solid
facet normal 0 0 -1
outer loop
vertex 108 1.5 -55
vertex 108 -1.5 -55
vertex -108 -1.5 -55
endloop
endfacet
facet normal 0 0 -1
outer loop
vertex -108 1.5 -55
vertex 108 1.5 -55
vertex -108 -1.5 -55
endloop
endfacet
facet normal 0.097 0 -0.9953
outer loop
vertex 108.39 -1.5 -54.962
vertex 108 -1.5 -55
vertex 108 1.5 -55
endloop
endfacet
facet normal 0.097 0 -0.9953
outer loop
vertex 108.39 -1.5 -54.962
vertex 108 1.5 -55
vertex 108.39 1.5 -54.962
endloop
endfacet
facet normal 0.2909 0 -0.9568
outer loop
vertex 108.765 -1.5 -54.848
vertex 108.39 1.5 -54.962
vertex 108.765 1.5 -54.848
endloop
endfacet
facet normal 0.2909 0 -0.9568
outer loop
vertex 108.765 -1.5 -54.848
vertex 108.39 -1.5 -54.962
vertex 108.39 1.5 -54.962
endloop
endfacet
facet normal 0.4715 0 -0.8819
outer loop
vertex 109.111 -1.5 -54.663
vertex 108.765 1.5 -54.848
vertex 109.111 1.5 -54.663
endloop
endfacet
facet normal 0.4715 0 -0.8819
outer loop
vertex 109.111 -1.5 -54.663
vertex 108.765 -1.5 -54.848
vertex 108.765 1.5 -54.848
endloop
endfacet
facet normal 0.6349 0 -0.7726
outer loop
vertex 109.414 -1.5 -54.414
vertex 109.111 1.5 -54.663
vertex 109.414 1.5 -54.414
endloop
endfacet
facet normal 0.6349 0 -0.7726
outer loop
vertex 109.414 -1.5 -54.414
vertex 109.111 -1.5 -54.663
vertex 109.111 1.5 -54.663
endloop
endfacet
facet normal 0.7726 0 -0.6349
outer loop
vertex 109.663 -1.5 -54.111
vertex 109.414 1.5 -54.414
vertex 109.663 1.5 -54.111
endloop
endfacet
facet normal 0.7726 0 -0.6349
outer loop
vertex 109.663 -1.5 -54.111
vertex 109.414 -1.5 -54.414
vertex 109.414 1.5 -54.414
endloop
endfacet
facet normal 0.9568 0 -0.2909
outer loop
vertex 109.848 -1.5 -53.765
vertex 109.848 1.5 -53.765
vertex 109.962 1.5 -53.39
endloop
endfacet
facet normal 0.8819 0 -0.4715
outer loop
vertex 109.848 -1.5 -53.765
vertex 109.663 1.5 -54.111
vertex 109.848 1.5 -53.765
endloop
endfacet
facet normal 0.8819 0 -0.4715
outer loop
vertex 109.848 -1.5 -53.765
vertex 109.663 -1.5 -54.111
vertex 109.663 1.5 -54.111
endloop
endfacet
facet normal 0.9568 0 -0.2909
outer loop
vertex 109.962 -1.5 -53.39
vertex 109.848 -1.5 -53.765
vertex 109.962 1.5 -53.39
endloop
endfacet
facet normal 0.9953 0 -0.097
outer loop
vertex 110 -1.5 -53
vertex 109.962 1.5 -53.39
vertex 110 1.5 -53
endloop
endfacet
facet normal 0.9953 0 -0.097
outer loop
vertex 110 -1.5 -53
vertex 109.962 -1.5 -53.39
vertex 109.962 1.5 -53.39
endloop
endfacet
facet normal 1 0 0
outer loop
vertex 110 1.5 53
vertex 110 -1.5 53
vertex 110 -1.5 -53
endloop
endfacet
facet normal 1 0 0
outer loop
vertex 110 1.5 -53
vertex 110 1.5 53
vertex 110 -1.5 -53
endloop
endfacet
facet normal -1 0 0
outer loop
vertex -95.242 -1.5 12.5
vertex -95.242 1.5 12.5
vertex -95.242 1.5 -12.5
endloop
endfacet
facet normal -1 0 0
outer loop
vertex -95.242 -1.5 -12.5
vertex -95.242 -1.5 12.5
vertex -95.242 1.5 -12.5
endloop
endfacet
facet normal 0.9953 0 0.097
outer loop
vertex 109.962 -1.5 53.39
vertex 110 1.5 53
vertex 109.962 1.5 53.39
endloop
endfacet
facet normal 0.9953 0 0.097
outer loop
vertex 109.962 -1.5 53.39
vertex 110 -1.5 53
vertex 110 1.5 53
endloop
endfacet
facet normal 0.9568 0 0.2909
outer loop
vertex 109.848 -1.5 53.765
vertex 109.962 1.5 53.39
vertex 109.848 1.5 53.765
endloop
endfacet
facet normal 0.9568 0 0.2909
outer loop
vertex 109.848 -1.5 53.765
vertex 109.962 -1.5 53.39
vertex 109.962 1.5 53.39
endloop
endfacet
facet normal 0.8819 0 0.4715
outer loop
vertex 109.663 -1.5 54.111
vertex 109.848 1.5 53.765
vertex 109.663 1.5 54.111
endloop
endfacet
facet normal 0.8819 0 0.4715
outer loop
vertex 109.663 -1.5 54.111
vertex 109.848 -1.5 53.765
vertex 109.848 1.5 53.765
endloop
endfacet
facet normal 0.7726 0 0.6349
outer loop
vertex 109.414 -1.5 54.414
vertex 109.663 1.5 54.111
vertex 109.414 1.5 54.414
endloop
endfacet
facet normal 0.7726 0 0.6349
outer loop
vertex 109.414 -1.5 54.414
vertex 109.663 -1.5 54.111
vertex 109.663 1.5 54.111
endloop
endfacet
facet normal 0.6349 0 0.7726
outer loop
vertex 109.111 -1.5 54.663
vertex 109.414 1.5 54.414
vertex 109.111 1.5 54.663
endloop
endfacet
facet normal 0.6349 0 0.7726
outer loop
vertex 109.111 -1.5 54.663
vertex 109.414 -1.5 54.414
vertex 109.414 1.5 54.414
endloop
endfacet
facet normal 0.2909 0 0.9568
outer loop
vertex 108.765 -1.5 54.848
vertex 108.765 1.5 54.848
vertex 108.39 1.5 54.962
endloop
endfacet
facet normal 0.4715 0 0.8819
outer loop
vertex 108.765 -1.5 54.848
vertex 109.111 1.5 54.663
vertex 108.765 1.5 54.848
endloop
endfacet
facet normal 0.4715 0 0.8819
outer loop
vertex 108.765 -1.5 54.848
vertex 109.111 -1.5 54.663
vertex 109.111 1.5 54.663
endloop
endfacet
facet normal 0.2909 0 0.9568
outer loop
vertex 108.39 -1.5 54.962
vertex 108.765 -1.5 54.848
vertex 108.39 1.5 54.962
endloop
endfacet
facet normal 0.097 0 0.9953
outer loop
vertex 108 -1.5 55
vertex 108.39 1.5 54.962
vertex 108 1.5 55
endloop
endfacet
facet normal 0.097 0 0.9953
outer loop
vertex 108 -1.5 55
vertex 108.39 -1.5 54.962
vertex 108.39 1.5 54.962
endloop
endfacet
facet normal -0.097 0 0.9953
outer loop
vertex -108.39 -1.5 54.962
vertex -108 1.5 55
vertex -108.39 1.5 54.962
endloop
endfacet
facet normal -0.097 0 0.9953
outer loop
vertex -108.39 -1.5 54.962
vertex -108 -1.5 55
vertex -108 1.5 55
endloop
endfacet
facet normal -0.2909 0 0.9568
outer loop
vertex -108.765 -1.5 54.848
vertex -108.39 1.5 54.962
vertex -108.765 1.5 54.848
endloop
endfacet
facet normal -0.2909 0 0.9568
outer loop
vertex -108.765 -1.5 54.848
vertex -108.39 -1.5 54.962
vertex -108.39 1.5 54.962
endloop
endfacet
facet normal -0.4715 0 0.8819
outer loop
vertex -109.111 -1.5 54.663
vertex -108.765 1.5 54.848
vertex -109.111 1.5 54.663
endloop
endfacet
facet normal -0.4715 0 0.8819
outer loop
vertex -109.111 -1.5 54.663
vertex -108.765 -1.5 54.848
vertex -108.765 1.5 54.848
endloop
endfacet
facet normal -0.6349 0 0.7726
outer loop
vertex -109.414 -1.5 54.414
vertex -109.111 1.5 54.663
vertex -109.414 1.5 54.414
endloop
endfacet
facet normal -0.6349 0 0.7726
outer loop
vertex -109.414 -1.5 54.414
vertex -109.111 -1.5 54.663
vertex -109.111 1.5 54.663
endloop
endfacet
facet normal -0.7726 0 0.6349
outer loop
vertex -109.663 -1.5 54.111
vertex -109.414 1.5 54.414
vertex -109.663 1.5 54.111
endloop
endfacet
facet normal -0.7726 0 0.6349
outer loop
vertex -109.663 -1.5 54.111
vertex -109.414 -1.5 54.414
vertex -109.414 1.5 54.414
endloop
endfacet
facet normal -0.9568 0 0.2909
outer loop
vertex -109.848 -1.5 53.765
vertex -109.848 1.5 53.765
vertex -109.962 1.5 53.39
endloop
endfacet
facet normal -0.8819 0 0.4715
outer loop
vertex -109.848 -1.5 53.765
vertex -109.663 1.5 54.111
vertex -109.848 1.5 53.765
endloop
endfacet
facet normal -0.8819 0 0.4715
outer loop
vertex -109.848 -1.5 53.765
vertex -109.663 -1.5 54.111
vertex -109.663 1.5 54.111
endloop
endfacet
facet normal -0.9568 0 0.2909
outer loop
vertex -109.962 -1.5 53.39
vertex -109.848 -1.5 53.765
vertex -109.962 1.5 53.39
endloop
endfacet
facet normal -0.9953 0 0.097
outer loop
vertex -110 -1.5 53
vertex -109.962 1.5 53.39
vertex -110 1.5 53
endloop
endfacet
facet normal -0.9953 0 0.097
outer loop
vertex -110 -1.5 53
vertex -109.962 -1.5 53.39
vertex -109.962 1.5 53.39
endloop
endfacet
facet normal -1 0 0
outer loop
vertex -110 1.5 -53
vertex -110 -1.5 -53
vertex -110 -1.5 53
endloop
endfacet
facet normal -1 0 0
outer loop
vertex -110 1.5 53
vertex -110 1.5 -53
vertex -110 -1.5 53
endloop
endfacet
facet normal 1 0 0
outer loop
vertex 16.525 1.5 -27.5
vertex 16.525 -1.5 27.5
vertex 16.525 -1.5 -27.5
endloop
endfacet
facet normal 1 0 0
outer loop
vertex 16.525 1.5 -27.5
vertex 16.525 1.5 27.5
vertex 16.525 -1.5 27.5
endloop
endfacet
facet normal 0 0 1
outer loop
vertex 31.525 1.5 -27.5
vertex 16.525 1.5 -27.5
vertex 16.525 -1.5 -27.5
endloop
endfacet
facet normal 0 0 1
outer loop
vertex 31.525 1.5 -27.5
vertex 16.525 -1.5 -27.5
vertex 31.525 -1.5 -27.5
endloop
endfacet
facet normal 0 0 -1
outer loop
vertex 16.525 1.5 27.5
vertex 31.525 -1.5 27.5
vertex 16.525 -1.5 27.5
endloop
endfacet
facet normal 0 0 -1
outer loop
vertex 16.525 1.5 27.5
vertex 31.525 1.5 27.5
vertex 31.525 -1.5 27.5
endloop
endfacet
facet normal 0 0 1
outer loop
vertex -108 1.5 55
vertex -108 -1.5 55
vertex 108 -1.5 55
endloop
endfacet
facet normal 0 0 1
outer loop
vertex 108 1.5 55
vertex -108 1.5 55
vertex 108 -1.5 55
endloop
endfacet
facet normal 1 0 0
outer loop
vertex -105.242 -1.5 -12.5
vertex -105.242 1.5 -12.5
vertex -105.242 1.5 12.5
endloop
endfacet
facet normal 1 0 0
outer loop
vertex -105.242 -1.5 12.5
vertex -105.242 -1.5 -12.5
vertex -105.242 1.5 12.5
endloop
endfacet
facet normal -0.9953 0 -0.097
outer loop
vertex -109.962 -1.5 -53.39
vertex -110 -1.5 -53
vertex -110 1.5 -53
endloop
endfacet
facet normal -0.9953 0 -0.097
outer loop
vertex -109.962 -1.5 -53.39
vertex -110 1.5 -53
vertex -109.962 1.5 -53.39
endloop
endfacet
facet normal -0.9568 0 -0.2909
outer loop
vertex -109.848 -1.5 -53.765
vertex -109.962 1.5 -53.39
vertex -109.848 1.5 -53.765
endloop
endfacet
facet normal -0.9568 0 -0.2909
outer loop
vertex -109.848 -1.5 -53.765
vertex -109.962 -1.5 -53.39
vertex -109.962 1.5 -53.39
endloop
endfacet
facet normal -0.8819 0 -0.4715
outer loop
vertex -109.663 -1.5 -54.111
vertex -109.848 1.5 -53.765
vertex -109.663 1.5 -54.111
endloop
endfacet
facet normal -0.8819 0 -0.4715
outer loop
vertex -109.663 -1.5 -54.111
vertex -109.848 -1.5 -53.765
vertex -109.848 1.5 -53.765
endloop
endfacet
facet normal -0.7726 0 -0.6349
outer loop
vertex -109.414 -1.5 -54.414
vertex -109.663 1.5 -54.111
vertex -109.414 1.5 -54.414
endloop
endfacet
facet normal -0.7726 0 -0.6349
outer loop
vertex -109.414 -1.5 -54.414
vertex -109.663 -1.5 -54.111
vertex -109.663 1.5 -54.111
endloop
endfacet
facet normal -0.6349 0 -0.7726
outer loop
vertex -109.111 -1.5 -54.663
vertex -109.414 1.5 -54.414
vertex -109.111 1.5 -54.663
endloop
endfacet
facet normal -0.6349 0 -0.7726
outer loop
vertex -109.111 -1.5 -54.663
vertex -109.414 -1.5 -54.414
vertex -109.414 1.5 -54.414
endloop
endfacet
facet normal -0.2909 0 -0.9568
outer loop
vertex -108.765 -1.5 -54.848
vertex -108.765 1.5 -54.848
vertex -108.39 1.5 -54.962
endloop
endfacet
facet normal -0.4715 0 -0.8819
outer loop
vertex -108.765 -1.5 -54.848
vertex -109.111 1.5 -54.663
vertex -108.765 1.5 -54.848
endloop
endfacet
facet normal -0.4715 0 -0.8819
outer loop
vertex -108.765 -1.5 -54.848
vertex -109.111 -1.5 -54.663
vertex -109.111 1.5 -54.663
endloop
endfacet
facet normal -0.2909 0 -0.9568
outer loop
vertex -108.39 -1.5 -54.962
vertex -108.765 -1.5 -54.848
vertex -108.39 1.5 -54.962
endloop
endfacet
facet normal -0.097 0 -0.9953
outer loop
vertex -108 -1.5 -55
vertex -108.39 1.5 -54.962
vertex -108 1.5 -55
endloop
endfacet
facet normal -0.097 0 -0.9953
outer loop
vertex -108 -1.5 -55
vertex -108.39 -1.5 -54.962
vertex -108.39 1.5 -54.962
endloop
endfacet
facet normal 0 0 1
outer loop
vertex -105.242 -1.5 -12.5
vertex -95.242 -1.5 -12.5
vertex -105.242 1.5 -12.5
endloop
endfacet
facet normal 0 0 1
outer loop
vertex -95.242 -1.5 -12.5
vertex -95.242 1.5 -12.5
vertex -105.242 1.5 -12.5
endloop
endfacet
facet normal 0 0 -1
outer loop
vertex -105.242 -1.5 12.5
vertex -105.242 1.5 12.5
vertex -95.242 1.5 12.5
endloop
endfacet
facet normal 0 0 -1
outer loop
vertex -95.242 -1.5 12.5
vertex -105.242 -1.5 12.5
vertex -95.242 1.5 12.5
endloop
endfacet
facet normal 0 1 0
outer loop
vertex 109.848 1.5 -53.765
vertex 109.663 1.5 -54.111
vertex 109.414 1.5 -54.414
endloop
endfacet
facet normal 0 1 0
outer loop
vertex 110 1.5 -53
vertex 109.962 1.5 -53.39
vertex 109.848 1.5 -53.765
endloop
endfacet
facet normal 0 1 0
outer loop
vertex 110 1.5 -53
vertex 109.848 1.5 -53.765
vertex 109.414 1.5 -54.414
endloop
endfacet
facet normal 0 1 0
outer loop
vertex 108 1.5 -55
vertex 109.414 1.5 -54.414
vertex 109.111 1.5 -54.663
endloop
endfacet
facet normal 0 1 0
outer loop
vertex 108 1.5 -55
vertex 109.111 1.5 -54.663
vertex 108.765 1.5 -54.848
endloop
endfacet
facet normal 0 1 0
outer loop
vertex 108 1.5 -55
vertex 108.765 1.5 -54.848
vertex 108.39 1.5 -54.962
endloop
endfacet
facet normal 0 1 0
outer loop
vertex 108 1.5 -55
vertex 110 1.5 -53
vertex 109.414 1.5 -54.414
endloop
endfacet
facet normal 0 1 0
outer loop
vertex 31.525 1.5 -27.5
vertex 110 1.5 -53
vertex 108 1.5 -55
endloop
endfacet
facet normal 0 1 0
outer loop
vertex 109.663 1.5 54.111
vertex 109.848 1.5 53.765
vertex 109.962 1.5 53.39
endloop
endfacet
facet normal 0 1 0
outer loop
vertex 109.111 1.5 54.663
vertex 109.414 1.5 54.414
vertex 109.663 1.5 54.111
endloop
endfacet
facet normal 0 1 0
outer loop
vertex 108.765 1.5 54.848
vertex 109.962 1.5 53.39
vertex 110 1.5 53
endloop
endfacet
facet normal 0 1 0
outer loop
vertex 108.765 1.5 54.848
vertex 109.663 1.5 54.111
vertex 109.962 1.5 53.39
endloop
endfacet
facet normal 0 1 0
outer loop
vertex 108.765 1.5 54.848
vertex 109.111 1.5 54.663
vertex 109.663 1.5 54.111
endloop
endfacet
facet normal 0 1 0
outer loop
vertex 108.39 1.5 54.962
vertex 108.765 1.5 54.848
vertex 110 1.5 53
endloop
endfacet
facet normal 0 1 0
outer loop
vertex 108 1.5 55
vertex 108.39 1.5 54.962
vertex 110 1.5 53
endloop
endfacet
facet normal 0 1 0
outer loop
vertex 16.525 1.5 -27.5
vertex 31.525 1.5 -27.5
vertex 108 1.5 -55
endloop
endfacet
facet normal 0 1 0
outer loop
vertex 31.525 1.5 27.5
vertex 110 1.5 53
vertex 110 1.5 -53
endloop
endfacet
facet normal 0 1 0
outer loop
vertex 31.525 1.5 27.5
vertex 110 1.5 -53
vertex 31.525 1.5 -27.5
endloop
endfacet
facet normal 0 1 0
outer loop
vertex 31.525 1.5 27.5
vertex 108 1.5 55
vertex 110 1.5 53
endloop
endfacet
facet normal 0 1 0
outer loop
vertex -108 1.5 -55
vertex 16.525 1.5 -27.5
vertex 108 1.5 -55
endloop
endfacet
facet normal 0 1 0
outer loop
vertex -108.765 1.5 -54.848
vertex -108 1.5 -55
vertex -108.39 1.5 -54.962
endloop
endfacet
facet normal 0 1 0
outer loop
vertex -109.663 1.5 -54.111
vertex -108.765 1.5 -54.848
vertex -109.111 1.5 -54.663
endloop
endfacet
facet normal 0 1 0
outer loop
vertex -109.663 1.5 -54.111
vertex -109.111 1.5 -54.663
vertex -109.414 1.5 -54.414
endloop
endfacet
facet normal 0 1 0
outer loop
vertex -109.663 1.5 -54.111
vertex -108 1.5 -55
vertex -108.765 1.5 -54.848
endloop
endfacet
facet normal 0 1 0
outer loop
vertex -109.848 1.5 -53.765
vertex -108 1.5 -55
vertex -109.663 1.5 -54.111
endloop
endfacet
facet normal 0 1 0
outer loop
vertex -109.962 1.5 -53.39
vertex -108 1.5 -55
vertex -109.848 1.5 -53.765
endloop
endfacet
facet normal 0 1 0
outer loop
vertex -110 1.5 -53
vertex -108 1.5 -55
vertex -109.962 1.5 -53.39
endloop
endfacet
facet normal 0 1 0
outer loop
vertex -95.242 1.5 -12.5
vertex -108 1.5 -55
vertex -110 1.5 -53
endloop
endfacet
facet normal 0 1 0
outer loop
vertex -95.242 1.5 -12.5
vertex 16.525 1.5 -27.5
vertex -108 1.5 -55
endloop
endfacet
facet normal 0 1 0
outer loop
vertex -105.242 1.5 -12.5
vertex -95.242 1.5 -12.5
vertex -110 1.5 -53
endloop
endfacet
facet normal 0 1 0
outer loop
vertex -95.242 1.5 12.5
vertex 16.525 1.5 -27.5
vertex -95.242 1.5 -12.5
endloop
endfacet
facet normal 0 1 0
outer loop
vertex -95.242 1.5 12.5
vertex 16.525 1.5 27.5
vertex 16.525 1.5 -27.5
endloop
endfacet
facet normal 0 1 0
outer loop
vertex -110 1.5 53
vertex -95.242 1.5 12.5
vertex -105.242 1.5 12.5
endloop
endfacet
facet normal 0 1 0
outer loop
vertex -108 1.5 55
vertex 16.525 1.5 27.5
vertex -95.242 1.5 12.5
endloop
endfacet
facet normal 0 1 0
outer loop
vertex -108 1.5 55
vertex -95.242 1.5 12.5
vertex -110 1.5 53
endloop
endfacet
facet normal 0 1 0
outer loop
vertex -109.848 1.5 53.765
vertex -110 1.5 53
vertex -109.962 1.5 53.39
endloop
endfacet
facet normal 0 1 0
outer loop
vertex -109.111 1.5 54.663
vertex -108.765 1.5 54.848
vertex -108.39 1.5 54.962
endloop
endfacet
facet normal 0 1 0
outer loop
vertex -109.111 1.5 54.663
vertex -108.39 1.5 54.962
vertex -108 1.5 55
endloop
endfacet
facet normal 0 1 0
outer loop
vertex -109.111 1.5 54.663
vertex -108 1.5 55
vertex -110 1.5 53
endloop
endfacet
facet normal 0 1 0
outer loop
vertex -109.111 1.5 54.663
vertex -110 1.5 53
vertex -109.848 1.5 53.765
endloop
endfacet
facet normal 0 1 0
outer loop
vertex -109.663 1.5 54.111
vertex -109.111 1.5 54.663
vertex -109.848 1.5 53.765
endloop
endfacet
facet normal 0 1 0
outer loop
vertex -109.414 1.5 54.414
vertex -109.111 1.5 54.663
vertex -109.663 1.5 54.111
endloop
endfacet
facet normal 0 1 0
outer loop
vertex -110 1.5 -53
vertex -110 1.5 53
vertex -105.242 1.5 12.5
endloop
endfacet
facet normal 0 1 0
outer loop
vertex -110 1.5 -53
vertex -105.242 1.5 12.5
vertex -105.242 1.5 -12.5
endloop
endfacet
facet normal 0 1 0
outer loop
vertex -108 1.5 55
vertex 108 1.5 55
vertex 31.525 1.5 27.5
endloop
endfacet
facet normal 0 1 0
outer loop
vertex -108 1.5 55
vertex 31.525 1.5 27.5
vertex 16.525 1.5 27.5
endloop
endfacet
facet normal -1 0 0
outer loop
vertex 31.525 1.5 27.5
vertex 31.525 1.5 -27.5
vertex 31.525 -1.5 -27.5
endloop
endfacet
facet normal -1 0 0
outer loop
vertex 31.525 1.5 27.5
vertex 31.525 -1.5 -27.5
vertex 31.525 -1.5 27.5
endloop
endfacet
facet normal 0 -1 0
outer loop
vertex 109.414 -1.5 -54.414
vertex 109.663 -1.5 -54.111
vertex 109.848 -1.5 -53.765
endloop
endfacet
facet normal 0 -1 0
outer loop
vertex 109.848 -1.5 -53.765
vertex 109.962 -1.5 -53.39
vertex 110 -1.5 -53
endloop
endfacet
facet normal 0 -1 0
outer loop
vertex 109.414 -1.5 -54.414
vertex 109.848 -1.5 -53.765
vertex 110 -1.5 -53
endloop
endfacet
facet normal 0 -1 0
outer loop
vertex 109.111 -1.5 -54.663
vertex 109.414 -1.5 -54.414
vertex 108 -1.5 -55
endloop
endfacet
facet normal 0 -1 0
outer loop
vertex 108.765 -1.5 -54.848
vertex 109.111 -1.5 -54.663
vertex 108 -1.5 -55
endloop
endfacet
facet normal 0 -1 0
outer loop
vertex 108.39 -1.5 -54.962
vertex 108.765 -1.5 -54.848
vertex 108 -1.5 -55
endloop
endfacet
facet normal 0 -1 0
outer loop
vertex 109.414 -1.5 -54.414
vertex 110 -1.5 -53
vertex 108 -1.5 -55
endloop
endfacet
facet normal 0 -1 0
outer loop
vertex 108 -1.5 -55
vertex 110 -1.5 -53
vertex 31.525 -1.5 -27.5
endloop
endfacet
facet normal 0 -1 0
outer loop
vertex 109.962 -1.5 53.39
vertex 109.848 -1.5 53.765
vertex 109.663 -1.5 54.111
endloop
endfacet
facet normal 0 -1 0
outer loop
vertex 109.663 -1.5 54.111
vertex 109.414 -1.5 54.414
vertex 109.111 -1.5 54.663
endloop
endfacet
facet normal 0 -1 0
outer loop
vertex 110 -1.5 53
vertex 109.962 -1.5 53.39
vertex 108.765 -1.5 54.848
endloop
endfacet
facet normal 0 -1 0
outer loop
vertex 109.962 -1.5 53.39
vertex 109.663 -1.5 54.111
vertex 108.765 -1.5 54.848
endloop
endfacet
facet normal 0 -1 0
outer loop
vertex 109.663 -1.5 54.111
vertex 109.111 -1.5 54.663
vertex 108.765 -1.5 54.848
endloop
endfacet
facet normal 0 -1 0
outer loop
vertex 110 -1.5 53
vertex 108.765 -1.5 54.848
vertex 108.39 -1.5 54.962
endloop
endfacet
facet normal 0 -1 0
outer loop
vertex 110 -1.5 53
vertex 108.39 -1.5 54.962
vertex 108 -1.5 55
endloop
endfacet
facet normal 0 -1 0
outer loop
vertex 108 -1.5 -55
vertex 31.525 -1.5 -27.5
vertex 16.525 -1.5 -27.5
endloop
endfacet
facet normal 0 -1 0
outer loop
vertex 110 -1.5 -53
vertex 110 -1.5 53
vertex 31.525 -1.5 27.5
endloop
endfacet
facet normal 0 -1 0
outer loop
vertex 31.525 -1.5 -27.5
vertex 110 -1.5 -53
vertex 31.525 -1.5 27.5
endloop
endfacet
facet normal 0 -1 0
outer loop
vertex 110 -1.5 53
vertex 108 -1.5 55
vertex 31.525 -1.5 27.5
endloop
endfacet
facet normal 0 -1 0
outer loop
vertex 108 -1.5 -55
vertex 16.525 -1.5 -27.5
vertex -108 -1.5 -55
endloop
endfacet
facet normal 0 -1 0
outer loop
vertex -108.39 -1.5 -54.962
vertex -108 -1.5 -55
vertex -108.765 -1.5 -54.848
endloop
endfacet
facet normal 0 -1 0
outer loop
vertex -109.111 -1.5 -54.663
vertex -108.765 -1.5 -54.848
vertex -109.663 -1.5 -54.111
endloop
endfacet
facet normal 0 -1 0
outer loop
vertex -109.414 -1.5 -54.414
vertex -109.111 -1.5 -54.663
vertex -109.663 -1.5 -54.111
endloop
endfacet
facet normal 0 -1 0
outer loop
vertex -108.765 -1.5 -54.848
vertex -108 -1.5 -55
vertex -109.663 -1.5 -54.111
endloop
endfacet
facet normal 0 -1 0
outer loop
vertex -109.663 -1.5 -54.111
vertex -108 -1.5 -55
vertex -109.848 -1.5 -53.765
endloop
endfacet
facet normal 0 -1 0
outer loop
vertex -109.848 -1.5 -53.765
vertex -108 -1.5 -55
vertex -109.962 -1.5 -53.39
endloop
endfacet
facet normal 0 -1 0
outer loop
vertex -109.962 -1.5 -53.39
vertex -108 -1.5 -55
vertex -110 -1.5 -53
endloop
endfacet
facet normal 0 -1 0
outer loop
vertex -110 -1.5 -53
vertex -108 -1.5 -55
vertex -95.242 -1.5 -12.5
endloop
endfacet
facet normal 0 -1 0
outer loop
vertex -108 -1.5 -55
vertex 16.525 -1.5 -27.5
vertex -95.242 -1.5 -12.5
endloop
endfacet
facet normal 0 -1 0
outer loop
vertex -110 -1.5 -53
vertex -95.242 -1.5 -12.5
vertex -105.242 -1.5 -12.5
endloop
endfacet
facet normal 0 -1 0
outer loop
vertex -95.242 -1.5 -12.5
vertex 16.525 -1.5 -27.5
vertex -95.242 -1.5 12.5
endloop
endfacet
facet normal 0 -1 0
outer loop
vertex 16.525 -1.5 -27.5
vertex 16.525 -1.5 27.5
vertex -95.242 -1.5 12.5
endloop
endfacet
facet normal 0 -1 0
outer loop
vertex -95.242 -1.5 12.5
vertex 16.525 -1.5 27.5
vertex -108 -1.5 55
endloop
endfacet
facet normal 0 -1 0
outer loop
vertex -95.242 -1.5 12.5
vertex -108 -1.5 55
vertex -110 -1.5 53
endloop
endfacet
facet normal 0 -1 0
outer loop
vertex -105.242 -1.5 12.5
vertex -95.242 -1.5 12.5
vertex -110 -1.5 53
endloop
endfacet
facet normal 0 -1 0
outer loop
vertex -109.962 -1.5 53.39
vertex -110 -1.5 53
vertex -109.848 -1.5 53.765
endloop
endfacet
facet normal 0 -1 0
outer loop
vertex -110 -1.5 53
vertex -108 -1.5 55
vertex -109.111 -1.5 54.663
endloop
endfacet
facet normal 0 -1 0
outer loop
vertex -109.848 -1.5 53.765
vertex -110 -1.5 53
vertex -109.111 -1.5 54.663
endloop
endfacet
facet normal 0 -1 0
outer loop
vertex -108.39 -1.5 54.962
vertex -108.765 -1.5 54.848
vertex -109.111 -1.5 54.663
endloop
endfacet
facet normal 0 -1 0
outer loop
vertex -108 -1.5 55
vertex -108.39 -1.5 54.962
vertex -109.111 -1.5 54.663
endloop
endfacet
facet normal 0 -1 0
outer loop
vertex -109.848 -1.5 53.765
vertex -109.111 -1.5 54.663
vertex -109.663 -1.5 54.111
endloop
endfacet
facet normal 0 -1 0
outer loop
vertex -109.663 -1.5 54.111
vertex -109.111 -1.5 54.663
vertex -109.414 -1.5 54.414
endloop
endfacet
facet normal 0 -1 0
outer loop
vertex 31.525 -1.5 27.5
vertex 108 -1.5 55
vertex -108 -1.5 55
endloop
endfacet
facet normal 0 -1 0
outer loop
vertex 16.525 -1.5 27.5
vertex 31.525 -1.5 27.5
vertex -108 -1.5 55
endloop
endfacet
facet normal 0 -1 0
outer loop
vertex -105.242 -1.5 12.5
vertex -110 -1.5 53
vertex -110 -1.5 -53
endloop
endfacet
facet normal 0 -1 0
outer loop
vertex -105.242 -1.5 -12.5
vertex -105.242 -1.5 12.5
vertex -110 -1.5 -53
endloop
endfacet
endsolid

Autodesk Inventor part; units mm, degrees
ref_plane "YZ Plane" through (0, 0, 0) normal (1, 0, 0) x (0, 1, 0)
ref_plane "XZ Plane" through (0, 0, 0) normal (0, 1, 0) x (-1, 0, 0)
ref_plane "XY Plane" through (0, 0, 0) normal (0, 0, 1) x (1, 0, 0)
sketch "Sketch1" plane through (0, 0, 0) normal (0, 1, 0) x (-1, 0, 0)
  line L0 (108, 55) -> (-108, 55)
  line L1 (-110, 53) -> (-110, -53)
  line L2 (-108, -55) -> (108, -55)
  line L3 (110, -53) -> (110, 53)
  arc A0 (110, 53) -> (108, 55) centre (108, 53) ccw
  arc A1 (108, -55) -> (110, -53) centre (108, -53) ccw
  arc A2 (-110, -53) -> (-108, -55) centre (-108, -53) ccw
  arc A3 (-108, 55) -> (-110, 53) centre (-108, 53) ccw
  point P0 (0, 0)
extrude "Extrusion1" add sketch "Sketch1" along normal mid plane 3
sketch "Sketch2" plane through (0, 1.5, 0) normal (0, 1, 0) x (1, 0, 0)
  line L0 (12.1921, -50) -> (92.1921, -50)
  line L1 (92.1921, -50) -> (92.1921, 50)
  line L2 (92.1921, 50) -> (12.1921, 50)
  line L3 (12.1921, 50) -> (12.1921, -50)
  line L4 (-95.242, 12.5) -> (-105.242, 12.5)
  line L5 (-105.242, 12.5) -> (-105.242, -12.5)
  line L6 (-105.242, -12.5) -> (-95.242, -12.5)
  line L7 (-95.242, -12.5) -> (-95.242, 12.5)
  circle A0 centre (5.4677, -30.1554) radius 1.5
  line L8 (0, 0) -> (5.4677, 0)
  circle A1 centre (5.4677, 30.1554) radius 1.5
  line L9 (-4.7214, 27.5) -> (-89.7214, 27.5)
  line L10 (-89.7214, 27.5) -> (-89.7214, -27.5)
  line L11 (-89.7214, -27.5) -> (-4.7214, -27.5)
  line L12 (-4.7214, -27.5) -> (-4.7214, 27.5)
  line L13 (16.5249, 27.5) -> (31.5249, 27.5)
  line L14 (31.5249, 27.5) -> (31.5249, -27.5)
  line L15 (31.5249, -27.5) -> (16.5249, -27.5)
  line L16 (16.5249, -27.5) -> (16.5249, 27.5)
  point P0 (52.1921, 0)
extrude "Extrusion2" cut sketch "Sketch2" against normal blind 3 contours L7 L6 L5 L4 | L13 L14 L15 L16
sketch "Sketch3" plane through (0, 1.5, 0) normal (0, 1, 0) x (1, 0, 0)
  point P0 (0, 0)
properties part number "AtasFix"
